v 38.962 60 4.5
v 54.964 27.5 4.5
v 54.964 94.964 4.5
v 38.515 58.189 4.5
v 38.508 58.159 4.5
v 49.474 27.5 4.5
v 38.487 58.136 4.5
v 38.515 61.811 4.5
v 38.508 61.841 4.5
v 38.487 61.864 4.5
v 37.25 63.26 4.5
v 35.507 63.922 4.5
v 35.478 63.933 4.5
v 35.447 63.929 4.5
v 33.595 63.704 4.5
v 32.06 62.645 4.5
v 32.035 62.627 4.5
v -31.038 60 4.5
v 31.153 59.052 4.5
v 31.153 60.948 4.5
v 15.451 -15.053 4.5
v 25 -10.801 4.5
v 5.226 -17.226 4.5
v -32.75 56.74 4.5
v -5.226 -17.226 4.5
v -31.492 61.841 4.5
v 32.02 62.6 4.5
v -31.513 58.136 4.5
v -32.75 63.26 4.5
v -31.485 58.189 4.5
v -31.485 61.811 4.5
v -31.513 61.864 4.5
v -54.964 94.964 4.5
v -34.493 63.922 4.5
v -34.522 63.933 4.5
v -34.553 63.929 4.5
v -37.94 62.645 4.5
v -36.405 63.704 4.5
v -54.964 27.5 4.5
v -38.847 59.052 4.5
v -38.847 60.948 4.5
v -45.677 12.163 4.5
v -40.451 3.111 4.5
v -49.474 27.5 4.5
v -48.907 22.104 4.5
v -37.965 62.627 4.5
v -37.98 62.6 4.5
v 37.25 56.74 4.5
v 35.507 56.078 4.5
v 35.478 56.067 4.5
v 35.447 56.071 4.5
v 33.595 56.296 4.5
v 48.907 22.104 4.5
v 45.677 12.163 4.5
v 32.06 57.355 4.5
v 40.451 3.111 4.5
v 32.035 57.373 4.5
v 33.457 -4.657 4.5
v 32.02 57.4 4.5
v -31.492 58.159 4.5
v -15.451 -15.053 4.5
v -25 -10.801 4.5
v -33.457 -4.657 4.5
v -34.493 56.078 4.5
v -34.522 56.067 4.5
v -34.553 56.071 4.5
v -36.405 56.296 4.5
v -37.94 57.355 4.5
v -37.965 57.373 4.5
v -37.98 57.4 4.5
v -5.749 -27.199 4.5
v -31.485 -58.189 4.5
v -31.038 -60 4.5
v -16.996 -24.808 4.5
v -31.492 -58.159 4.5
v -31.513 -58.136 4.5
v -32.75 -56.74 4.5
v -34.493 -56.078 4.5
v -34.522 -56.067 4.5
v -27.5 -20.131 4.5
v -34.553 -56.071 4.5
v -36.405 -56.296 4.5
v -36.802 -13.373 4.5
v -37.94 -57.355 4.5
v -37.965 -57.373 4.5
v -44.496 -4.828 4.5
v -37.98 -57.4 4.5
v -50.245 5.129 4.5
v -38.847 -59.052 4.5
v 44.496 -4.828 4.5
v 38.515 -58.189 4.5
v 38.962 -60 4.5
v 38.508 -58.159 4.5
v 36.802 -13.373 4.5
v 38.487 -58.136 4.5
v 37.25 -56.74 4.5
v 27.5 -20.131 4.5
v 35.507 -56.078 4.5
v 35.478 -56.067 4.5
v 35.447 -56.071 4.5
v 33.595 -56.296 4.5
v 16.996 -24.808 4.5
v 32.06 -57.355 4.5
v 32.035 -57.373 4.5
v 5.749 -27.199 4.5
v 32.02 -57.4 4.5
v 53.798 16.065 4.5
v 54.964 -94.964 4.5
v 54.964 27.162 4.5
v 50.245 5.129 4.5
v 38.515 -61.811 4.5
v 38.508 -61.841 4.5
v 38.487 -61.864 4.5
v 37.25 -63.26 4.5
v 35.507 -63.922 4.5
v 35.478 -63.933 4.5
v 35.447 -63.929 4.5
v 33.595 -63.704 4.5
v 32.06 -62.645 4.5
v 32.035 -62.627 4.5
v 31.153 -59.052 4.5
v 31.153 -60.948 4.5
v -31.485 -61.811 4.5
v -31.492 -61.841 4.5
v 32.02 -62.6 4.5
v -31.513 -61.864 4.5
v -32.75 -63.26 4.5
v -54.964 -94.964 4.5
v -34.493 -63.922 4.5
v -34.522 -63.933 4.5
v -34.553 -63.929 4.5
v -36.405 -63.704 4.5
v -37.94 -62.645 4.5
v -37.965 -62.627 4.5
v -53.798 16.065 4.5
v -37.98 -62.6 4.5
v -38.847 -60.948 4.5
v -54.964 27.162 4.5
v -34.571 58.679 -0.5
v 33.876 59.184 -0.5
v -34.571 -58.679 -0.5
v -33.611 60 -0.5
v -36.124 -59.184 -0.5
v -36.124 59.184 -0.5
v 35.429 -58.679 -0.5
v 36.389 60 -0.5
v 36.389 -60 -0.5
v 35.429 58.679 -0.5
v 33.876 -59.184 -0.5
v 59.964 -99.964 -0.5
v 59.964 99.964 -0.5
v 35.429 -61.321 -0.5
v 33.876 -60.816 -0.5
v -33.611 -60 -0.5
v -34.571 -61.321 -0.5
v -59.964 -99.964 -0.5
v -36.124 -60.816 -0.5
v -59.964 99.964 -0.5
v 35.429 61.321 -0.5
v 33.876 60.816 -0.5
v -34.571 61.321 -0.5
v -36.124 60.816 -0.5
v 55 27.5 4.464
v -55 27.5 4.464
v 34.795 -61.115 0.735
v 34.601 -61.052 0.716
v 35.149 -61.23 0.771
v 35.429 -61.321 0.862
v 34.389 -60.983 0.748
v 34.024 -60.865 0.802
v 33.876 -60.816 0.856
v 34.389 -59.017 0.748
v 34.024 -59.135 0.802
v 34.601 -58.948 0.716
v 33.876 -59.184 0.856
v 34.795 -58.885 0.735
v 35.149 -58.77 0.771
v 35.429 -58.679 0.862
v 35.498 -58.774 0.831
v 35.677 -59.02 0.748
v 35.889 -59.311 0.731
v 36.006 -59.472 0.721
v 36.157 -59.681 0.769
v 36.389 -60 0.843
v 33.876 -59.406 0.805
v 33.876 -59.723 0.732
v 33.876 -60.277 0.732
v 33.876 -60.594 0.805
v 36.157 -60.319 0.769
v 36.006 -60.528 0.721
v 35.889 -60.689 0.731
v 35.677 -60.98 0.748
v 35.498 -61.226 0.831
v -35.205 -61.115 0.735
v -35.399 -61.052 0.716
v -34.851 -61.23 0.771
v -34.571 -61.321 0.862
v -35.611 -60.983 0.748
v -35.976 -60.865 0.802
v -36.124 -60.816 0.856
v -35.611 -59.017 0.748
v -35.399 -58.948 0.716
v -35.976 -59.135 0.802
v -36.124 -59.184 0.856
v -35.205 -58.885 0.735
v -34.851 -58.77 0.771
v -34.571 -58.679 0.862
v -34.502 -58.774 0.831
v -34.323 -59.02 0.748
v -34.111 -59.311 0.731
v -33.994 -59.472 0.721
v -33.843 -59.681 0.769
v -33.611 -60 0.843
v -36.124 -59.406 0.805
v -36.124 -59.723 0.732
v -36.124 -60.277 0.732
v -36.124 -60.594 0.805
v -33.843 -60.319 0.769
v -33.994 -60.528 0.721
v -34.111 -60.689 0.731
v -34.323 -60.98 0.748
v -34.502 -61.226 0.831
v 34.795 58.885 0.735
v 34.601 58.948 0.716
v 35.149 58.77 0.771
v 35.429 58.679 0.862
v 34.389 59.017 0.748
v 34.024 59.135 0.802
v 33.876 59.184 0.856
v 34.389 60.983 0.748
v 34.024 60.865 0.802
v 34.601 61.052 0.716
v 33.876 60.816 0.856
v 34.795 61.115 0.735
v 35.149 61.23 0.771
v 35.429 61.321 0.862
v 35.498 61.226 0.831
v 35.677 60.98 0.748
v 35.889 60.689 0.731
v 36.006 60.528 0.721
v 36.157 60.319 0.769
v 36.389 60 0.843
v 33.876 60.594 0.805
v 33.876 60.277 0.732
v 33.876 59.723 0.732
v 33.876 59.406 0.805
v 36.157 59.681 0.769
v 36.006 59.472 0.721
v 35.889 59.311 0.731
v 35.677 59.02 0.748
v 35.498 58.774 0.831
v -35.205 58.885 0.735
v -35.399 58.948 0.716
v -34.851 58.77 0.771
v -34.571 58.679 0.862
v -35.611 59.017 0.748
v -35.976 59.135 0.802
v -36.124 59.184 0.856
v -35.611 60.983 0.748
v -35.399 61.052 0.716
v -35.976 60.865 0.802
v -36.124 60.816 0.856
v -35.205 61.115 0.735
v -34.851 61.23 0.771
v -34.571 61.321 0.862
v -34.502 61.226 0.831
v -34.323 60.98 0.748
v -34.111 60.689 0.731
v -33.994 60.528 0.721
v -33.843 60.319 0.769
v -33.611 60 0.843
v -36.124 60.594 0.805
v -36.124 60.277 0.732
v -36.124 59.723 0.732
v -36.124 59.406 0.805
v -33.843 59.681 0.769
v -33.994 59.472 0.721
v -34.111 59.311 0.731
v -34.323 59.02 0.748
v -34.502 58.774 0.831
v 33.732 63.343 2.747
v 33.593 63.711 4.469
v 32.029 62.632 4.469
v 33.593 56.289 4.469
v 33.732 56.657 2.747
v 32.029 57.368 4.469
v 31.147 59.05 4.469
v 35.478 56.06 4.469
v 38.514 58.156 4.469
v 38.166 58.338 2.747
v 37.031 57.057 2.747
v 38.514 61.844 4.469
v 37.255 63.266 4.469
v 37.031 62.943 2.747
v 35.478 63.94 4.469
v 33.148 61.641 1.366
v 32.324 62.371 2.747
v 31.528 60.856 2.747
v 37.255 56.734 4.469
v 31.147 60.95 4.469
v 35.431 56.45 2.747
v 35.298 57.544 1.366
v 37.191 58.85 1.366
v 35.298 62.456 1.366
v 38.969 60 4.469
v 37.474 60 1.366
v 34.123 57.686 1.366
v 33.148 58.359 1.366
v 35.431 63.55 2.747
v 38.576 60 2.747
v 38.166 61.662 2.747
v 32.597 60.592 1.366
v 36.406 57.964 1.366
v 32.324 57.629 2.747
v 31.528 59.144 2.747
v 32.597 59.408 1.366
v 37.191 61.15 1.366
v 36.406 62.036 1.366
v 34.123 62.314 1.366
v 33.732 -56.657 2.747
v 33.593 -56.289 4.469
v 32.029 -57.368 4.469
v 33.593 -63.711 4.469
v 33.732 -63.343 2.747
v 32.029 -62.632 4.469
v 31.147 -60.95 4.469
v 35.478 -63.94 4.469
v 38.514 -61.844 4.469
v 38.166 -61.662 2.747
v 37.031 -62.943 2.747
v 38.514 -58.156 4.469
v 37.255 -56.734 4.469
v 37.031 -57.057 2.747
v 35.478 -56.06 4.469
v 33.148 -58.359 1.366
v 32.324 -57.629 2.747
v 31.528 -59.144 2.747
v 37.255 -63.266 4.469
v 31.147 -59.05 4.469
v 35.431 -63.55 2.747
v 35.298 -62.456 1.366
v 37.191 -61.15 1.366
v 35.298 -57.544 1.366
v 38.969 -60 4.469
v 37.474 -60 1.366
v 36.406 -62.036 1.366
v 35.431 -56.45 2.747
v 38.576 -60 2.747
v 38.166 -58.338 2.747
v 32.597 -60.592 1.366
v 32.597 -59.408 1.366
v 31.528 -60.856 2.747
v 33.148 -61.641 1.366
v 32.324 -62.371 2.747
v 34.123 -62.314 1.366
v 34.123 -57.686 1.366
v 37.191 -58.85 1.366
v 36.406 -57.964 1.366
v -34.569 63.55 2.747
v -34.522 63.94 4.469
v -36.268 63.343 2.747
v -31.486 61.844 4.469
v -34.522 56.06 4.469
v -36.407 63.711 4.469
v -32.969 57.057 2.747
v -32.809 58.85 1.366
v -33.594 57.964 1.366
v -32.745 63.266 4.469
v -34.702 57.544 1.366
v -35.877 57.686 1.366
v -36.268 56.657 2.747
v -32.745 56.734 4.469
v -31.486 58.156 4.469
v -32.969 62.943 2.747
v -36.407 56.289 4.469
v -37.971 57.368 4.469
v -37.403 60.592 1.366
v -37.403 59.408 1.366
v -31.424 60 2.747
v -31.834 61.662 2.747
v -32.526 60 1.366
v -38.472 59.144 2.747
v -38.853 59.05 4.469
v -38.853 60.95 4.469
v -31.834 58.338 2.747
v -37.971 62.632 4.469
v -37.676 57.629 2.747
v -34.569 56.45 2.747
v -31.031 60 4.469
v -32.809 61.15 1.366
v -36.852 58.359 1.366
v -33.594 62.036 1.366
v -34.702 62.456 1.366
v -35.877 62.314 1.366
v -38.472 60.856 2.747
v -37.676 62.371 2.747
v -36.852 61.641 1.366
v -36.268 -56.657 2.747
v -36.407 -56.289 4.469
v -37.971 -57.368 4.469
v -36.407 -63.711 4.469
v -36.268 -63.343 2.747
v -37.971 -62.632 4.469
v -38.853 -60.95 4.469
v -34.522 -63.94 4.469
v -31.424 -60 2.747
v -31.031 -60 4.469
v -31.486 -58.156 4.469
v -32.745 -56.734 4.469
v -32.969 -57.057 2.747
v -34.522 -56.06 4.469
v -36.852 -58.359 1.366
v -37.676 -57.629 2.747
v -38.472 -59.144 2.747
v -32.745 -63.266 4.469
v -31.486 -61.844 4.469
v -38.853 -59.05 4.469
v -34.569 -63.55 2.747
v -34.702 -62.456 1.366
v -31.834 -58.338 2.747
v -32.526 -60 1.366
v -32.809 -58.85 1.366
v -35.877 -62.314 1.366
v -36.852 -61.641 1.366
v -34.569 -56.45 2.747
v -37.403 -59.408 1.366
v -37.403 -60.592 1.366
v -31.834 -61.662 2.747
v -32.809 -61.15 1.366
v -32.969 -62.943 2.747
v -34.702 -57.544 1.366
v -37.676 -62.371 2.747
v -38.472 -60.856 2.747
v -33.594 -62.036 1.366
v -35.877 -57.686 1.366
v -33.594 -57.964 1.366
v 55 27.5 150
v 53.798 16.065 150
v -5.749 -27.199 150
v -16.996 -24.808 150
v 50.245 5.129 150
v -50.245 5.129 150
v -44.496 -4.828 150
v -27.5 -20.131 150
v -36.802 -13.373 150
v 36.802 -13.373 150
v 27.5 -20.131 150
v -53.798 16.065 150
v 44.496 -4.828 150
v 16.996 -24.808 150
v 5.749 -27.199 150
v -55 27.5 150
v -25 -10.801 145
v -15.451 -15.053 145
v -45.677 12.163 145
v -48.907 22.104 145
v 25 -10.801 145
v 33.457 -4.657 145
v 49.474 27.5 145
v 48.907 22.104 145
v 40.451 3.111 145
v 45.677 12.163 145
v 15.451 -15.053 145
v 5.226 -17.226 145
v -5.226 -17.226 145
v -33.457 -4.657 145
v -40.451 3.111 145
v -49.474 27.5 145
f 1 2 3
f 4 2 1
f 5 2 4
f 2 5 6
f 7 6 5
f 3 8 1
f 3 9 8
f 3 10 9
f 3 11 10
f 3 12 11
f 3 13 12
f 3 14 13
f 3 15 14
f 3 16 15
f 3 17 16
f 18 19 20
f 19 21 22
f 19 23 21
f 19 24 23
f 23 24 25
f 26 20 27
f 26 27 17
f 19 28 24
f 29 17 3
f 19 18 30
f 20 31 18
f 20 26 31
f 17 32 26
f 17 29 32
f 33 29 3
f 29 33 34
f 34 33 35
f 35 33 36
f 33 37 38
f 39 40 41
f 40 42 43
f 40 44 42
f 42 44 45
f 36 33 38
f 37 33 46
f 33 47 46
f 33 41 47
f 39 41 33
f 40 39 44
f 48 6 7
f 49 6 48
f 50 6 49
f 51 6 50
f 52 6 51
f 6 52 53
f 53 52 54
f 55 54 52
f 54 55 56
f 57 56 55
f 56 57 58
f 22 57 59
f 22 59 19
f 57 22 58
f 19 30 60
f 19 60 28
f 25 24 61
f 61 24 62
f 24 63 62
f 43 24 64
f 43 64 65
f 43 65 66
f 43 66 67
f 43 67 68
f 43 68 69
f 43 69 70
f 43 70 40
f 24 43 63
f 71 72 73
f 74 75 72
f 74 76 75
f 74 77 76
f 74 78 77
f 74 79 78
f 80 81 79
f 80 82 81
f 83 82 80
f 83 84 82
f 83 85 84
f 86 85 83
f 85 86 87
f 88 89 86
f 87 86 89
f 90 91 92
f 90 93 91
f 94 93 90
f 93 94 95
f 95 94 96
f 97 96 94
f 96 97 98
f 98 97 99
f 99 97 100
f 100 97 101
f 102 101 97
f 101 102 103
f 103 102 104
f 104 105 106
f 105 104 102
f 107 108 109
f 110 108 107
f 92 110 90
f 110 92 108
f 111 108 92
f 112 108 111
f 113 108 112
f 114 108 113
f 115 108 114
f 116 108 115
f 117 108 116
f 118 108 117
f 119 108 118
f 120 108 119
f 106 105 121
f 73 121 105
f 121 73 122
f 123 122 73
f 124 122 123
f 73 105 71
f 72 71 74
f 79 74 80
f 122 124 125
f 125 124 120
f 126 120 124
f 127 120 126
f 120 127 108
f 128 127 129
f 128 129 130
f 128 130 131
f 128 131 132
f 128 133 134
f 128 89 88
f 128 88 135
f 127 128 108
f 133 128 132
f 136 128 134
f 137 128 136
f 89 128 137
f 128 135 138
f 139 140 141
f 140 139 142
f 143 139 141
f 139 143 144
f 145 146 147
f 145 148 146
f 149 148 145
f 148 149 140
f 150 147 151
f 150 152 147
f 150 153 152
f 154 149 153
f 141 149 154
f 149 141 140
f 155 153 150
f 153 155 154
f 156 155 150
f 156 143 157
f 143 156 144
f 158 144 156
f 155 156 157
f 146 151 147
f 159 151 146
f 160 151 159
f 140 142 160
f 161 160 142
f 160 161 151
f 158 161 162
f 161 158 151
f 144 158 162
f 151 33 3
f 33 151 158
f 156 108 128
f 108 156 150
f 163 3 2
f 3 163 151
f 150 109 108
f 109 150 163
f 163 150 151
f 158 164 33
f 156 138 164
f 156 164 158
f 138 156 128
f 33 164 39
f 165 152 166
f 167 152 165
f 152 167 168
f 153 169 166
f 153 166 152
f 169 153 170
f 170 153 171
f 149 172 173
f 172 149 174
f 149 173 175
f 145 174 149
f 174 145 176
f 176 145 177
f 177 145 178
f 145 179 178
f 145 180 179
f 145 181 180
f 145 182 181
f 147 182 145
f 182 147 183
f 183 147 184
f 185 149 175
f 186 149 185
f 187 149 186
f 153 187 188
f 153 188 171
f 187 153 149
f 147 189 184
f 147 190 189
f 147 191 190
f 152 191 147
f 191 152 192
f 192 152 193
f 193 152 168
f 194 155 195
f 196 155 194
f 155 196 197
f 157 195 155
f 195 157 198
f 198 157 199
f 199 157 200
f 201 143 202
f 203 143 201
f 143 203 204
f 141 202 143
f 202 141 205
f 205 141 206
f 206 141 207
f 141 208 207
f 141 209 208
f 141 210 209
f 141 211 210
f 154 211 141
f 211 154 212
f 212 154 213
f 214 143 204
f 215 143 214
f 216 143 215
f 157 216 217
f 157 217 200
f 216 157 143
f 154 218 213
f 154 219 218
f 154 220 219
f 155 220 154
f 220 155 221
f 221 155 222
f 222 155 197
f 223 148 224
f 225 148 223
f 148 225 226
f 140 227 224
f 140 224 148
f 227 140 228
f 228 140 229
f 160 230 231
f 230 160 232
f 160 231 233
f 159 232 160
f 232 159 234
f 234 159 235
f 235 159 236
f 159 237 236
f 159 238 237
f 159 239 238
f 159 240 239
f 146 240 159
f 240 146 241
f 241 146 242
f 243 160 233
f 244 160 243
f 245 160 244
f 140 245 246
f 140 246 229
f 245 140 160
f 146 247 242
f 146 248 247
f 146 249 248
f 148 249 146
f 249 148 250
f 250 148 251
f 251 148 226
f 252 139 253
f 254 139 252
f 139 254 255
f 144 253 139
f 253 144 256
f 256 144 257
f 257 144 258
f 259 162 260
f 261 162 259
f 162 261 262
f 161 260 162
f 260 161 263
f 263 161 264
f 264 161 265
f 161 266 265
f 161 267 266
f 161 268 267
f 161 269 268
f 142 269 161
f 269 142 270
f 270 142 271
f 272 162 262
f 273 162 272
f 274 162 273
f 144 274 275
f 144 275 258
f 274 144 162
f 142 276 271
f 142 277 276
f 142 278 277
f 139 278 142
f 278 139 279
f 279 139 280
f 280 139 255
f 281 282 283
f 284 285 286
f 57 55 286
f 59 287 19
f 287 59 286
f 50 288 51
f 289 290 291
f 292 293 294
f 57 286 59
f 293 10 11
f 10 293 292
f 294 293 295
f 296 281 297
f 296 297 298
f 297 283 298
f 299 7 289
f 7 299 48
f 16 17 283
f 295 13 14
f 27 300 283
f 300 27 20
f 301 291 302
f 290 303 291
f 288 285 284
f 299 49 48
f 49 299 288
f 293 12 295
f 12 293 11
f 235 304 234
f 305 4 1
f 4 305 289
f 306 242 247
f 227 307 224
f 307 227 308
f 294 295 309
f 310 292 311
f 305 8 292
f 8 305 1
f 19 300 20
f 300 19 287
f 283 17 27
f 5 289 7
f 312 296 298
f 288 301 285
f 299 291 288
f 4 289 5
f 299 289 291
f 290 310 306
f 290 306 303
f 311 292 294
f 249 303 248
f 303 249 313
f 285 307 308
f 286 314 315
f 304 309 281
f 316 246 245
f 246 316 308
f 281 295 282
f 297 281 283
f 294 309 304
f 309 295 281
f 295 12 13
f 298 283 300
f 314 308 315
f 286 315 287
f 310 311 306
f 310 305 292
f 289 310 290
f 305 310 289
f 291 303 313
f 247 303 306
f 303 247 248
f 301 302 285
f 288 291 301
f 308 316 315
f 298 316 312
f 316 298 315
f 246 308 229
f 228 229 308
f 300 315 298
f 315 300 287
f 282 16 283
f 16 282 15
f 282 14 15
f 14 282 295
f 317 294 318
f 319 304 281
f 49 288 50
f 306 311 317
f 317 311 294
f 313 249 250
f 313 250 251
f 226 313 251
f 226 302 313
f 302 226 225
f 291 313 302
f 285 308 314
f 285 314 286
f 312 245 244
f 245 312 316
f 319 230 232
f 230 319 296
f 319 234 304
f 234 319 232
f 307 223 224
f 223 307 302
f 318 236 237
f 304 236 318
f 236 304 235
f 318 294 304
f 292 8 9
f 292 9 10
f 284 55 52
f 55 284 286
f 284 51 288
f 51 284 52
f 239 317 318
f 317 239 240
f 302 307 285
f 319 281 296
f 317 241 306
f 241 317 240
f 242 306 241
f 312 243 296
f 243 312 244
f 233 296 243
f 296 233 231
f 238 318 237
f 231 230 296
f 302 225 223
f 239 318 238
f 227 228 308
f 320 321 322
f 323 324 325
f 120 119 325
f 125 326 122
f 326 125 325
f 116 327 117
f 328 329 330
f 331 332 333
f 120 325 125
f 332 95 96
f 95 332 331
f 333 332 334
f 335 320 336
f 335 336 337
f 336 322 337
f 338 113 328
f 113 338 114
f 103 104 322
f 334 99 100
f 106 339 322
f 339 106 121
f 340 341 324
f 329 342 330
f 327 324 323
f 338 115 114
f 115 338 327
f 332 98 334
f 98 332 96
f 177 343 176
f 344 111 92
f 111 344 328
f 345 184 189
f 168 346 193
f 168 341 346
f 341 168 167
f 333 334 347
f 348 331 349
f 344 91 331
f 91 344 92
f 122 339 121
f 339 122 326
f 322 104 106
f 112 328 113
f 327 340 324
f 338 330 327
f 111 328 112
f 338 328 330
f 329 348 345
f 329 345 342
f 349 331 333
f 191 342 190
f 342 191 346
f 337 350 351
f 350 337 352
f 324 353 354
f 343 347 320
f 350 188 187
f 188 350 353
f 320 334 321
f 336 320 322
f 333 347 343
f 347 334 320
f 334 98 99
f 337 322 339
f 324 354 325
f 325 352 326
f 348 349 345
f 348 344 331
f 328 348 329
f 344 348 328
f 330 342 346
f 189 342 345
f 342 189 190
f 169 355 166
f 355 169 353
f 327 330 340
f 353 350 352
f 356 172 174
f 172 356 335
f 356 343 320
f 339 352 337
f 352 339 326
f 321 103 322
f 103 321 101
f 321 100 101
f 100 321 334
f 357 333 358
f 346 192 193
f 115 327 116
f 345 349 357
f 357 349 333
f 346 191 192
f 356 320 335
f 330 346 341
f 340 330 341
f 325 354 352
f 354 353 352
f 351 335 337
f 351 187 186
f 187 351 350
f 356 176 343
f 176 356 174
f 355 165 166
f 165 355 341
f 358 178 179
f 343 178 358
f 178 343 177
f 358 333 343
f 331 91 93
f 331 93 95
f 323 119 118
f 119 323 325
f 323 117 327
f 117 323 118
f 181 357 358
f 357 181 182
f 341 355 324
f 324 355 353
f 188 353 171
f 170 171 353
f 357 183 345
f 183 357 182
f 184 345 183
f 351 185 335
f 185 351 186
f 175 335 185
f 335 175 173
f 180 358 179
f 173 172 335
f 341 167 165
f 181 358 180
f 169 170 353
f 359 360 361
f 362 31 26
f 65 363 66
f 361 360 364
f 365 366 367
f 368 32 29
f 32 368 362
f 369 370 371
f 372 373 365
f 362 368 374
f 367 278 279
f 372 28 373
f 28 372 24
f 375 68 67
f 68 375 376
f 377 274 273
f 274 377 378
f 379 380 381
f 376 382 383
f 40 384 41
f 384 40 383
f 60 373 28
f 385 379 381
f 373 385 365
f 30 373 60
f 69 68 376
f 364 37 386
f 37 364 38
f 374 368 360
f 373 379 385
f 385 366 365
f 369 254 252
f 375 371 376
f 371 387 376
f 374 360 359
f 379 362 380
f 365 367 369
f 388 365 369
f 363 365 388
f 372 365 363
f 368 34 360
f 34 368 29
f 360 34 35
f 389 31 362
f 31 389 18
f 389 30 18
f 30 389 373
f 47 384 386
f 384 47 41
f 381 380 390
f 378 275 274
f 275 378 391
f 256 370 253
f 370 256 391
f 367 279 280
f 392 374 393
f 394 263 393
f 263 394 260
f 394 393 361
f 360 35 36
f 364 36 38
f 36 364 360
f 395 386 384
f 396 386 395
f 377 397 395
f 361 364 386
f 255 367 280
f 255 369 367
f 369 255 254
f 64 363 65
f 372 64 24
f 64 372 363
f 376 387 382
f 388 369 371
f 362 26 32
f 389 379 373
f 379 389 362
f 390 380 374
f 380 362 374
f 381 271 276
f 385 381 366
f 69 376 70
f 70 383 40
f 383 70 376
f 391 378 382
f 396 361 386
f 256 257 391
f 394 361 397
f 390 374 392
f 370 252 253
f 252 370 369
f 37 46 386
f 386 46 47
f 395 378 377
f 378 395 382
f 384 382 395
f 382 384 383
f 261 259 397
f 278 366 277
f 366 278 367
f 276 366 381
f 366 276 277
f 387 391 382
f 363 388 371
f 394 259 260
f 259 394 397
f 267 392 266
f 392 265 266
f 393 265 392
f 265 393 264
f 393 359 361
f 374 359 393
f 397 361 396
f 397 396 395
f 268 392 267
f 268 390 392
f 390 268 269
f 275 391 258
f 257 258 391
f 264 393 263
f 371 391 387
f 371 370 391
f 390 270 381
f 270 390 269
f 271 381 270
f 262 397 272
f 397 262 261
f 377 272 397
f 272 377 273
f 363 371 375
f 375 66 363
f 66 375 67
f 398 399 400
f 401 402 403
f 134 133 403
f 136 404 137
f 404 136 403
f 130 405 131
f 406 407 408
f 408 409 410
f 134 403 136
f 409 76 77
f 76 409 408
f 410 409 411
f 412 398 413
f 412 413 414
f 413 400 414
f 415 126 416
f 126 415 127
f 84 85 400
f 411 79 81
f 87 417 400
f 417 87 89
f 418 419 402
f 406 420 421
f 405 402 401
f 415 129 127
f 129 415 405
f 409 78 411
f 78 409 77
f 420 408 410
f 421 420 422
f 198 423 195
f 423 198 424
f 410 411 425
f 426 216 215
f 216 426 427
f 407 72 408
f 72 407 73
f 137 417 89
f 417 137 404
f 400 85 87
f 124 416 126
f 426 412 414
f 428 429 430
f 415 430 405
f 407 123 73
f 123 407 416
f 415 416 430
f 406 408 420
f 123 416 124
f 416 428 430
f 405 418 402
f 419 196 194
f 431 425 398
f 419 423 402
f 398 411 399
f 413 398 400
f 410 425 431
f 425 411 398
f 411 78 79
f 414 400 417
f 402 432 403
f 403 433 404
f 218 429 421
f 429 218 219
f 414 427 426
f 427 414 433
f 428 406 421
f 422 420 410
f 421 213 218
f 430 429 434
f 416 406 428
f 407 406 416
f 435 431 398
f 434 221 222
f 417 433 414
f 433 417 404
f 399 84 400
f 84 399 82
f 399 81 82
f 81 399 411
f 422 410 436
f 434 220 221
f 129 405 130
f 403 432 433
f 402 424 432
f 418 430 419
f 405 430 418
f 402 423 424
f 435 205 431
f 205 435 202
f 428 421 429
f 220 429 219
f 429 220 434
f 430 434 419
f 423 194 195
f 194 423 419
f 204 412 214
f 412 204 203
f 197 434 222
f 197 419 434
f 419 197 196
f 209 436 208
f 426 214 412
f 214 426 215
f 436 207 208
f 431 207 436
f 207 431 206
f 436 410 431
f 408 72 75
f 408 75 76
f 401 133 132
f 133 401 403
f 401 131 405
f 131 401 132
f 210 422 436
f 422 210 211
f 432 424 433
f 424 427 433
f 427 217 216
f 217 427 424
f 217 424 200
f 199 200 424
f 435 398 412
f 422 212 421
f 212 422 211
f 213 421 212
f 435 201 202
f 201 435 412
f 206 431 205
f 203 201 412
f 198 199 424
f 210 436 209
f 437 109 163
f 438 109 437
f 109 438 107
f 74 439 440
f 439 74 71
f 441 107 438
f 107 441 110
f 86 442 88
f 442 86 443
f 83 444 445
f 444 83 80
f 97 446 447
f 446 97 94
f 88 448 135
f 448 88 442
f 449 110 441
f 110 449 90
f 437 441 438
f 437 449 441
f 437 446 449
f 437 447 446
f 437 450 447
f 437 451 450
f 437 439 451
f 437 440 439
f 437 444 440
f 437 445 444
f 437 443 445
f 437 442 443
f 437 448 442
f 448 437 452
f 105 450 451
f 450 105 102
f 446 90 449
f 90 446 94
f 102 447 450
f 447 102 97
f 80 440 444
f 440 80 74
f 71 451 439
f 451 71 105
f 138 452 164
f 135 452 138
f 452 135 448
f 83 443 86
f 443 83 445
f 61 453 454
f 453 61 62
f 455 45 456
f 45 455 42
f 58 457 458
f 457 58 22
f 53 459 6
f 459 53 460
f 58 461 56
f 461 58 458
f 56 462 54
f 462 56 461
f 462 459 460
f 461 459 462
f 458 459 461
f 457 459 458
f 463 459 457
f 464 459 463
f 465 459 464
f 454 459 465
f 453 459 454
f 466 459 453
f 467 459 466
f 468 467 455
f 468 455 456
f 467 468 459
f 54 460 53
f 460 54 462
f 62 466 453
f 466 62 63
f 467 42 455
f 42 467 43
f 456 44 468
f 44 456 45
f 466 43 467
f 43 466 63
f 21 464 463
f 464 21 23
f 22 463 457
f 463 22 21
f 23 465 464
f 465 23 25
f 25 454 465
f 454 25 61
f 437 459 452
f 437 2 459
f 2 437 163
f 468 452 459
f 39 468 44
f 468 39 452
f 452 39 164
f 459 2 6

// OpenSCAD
//Headphone Stand
//By Matthew Croft
//v.4 January 17,2019


//parameters-------------------------------------------------
cm=10;
screwd=0.2778125; //7 wood screw (mm)
screwhd=0.79375;
//render-----------------------------------------------------
stand();

//modules----------------------------------------------------
module stand() {
//bottom
  difference(){
    translate([0,0,cm*0.2]) cube([cm*12,cm*20,cm*0.5], center=true);
//smoothing base
    translate([0,cm*12.8,-cm*2.5]) rotate([-45,0,0]) cube([cm*14,cm*10,cm*0.5], center=true); 
    translate([0,cm*-12.8,-cm*2.5]) rotate([45,0,0]) cube([cm*14,cm*10,cm*0.5], center=true); 
    translate([cm*7.3,0,-cm]) rotate([0,45,0]) cube([cm*5,cm*21,cm*0.5], center=true); 
    translate([cm*-7.3,0,-cm]) rotate([0,-45,0]) cube([cm*5,cm*21,cm*0.5], center=true); 
//Screw Holes
    translate([cm*14/4,-cm*12/2,-1])cylinder(h=cm*4,d=screwd*cm,center=true);
    translate([-cm*14/4,-cm*12/2,-1])cylinder(h=cm*4,d=screwd*cm,center=true);
    translate([cm*14/4,cm*12/2,-1])cylinder(h=cm*4,d=screwd*cm,center=true);
    translate([-cm*14/4,cm*12/2,-1])cylinder(h=cm*4,d=screwd*cm,center=true);
//screw head
    translate([cm*14/4,cm*12/2,0.5+screwhd*cm/2])sphere(d=screwhd*cm);
    translate([cm*14/4,-cm*12/2,0.5+screwhd*cm/2])sphere(d=screwhd*cm);
    translate([-cm*14/4,cm*12/2,0.5+screwhd*cm/2])sphere(d=screwhd*cm);
    translate([-cm*14/4,-cm*12/2,0.5+screwhd*cm/2])sphere(d=screwhd*cm);
}
//holder
  translate([0,cm*11/4,0]) {
    difference(){
        translate([0,0,cm*7.5])cylinder(h=cm*15,d=cm*11,center=true);
        translate([0,cm*.5,cm*7.5-cm])cylinder(h=cm*16,d=cm*10,center=true);
        translate([0,cm*7.5,cm*7+0.45*cm-cm])cube([cm*14,cm*15,cm*20], center=true);
}
}
}
